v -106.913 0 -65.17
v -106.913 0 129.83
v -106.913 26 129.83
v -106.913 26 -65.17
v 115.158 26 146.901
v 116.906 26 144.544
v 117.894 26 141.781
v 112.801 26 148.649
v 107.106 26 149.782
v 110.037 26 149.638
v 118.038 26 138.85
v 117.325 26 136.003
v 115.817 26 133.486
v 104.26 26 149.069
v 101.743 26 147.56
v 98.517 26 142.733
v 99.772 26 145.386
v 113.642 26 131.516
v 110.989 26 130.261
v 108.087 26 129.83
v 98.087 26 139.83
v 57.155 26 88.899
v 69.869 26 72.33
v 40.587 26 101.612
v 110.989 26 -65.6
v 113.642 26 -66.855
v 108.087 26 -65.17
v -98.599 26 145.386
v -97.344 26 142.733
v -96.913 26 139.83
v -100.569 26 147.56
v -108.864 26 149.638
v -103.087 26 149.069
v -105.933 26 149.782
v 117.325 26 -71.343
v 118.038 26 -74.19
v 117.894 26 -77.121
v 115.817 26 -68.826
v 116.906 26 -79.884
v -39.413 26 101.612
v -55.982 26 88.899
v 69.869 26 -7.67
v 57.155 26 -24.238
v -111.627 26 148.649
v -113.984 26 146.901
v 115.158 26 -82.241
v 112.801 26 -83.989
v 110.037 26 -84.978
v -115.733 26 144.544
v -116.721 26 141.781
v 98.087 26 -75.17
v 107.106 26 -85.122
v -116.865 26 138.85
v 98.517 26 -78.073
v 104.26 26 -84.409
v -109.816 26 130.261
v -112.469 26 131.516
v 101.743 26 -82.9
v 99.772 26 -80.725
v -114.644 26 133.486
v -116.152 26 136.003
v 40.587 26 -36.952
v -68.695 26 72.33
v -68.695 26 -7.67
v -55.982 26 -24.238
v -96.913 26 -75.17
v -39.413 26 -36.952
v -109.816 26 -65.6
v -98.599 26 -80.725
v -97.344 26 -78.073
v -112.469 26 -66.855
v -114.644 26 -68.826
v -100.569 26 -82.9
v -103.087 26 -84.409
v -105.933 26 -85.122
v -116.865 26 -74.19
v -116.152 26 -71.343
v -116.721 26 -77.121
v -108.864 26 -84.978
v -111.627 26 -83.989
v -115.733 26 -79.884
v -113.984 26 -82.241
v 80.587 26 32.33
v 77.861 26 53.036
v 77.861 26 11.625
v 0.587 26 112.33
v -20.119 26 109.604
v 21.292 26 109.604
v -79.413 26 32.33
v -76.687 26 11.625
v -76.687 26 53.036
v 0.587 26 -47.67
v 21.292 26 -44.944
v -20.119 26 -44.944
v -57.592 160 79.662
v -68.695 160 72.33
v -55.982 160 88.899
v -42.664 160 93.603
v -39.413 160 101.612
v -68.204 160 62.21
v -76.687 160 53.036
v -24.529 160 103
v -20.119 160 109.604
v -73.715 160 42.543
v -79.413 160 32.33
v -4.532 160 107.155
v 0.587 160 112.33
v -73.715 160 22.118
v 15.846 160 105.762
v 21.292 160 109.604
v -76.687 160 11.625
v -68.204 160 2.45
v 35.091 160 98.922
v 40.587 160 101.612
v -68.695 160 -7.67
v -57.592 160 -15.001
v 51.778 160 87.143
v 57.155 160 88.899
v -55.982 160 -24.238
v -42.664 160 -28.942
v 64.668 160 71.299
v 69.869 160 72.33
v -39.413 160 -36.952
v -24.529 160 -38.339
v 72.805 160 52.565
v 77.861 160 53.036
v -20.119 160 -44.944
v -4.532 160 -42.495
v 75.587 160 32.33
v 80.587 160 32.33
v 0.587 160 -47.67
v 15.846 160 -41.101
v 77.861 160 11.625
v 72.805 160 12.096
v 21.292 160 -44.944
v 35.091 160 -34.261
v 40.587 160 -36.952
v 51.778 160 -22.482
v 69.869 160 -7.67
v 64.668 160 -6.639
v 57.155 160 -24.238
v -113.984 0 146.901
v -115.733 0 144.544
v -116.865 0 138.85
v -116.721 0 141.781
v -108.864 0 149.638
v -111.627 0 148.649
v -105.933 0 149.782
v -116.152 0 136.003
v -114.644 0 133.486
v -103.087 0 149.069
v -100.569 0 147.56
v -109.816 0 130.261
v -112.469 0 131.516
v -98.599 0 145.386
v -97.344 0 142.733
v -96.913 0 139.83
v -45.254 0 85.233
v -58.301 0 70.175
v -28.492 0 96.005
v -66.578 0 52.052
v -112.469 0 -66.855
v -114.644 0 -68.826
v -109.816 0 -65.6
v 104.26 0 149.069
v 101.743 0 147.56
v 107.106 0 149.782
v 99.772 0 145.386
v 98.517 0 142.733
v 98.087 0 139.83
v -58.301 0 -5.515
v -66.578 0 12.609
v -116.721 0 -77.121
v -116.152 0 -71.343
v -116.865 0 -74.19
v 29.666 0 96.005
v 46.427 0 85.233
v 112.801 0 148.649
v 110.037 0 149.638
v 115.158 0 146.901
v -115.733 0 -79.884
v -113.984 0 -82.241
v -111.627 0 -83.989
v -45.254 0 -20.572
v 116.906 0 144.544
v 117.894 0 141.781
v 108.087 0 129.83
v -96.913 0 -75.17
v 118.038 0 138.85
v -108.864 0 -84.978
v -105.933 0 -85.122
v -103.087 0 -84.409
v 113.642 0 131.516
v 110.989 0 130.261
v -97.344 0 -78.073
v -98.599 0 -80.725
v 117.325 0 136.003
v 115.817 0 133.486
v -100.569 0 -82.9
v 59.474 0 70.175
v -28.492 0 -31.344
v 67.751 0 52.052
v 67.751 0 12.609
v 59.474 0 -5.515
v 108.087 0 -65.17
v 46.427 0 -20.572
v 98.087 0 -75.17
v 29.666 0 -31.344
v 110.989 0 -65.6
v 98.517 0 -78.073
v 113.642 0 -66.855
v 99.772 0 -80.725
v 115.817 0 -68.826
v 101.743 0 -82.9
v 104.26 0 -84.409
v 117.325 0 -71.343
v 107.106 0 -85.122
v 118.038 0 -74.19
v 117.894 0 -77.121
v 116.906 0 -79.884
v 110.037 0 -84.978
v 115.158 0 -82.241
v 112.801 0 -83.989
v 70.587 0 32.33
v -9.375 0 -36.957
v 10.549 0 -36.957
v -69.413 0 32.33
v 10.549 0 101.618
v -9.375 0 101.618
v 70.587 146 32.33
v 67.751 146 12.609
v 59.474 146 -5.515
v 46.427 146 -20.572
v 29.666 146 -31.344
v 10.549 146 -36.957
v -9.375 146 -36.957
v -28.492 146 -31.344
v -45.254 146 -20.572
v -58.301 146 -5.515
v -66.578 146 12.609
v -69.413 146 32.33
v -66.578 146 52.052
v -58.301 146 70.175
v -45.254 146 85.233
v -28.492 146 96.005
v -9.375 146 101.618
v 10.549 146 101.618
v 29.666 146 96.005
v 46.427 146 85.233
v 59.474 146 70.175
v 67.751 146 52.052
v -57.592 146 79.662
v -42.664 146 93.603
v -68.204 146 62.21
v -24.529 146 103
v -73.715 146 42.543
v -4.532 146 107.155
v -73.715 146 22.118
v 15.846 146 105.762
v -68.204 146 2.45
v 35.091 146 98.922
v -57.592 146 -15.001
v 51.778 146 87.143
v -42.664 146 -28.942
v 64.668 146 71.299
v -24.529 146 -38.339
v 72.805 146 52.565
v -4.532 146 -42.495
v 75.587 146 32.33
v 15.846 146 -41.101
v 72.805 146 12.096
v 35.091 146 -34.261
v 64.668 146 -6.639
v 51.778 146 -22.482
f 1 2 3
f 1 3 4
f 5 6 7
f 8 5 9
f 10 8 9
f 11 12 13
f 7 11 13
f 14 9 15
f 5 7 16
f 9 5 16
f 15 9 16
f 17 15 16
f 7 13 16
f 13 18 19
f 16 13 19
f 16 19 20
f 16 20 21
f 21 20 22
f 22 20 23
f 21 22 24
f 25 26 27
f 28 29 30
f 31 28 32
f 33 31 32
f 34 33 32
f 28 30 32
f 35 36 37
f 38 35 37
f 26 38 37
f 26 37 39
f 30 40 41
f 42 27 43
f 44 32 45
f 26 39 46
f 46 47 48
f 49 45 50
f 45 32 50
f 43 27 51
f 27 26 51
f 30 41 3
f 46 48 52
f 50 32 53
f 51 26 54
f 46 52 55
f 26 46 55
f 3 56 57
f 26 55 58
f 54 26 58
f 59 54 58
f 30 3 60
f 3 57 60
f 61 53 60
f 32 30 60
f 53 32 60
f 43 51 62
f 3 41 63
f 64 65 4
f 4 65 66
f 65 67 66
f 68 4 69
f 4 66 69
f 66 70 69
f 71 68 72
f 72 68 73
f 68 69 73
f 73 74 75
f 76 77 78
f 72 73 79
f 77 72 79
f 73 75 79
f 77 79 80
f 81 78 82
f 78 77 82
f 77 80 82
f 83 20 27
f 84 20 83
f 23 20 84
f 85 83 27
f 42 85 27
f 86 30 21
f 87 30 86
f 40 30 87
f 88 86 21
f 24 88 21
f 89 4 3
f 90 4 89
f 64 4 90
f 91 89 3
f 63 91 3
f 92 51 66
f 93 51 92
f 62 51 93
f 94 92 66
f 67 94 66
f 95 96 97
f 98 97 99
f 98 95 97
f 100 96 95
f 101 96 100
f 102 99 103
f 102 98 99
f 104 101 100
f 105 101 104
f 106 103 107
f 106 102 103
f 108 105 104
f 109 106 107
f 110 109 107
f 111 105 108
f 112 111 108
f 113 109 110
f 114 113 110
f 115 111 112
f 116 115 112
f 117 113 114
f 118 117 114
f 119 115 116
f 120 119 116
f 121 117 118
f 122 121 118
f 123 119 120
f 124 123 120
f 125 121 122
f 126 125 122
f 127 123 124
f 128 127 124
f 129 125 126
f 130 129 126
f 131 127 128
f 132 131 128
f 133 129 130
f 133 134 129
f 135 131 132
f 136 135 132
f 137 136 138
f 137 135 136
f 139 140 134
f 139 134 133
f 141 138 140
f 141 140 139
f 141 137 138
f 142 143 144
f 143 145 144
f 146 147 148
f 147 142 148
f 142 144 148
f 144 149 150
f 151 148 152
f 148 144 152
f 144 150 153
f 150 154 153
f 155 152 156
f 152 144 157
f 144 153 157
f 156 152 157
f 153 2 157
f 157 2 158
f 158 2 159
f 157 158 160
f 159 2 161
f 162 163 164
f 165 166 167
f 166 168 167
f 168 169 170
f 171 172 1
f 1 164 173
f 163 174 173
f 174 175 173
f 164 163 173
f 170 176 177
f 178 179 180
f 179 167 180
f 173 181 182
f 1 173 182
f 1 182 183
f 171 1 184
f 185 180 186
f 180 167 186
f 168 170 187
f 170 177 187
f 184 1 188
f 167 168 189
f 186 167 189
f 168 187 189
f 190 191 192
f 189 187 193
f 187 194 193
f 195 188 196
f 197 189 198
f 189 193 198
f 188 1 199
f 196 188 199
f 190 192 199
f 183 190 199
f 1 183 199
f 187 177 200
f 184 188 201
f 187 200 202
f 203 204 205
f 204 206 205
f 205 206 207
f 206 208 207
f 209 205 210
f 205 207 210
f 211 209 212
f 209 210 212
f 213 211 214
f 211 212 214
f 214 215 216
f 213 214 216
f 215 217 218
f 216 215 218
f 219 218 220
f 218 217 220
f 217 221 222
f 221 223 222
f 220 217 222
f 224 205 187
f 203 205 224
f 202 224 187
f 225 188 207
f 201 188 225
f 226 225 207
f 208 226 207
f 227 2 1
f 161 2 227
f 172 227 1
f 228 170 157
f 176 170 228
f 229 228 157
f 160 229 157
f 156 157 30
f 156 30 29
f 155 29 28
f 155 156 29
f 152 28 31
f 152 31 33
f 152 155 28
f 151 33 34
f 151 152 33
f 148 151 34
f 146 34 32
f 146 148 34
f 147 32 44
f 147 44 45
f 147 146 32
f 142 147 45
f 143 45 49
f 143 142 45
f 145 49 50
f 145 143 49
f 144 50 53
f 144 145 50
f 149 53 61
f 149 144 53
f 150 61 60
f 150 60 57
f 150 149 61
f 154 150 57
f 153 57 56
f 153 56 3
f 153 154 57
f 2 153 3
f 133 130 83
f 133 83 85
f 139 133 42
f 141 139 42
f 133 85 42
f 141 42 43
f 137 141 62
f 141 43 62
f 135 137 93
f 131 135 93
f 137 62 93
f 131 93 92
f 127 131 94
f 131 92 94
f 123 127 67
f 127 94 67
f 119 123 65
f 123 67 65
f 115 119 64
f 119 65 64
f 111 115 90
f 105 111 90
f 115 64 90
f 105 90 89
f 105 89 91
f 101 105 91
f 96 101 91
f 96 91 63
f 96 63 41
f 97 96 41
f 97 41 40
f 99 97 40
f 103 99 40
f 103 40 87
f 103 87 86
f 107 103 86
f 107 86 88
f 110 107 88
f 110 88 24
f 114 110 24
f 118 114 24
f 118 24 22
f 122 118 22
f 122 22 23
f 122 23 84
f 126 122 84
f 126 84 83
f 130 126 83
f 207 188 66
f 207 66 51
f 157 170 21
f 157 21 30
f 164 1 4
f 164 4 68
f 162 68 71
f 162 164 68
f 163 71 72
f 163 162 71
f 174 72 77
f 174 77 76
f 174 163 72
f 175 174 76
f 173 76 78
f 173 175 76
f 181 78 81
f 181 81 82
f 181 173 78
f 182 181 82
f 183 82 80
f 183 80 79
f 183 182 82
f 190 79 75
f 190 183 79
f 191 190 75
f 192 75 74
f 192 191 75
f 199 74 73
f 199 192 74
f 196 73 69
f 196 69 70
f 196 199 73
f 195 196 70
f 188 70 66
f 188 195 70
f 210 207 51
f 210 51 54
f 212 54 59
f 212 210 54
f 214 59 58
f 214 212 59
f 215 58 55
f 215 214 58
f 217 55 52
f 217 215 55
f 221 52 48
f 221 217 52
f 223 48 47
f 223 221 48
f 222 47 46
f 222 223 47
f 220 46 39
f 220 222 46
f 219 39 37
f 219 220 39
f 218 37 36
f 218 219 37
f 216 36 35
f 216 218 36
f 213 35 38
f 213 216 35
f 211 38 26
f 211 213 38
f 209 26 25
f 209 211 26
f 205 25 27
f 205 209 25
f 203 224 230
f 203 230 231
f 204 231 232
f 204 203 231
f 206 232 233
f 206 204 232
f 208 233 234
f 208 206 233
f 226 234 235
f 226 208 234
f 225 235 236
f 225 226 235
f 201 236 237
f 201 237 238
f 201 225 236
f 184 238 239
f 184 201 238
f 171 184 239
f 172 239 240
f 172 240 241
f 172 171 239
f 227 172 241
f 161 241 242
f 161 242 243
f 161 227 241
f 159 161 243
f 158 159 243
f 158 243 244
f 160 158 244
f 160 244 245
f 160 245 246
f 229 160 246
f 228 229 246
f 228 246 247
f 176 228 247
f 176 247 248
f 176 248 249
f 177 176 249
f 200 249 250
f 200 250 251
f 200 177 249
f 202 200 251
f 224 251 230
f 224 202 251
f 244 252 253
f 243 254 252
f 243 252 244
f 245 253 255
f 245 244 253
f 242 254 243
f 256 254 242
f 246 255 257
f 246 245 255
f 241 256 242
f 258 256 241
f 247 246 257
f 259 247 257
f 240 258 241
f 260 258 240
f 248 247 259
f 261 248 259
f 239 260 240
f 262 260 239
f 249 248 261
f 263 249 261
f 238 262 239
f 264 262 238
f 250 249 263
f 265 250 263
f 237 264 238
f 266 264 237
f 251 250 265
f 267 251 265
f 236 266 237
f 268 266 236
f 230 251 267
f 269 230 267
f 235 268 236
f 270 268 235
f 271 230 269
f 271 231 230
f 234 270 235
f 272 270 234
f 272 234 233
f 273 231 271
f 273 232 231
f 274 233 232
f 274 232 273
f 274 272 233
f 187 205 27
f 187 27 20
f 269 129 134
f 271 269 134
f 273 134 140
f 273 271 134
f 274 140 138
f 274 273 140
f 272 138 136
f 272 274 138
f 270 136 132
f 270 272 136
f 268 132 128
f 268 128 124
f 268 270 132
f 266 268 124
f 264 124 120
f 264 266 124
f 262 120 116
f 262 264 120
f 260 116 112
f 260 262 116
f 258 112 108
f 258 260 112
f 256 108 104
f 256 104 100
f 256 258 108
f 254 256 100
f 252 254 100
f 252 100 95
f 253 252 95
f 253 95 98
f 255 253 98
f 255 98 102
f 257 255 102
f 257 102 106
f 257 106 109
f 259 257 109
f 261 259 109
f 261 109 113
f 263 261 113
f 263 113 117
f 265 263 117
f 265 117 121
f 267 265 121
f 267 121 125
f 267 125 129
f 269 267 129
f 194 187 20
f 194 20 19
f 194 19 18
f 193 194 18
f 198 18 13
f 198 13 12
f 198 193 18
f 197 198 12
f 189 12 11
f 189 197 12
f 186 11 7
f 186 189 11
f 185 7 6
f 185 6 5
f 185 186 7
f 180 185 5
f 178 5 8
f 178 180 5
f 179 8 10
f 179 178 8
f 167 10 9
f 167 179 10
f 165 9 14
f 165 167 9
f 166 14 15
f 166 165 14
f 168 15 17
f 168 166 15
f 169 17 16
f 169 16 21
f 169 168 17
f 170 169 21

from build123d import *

# Parameters (mm, degrees)
IZIM1_R                     = 80
Y_KSEKLIK_EKSTR_ZYON1_DEPTH = 26
IZIM1_7_R                   = 80
IZIM1_7_R_2                 = 75
Y_KSEKLIK_EKSTR_ZYON2_DEPTH = 160
IZIM1_9_R                   = 75
IZIM1_9_R_2                 = 70
Y_KSEKLIK_EKSTR_ZYON3_DEPTH = 146


with BuildPart() as part:
    # Çizim1 → Yükseklik-Ekstrüzyon1 (new body)
    with BuildSketch(Plane(origin=(0, 0, 0), x_dir=(1, 0, 0), z_dir=(0, 1, 0))):
        with BuildLine():
            Line((98.086576189, 75.169734496), (-96.913423811, 75.169734496))
            ThreePointArc((-96.913423811, 75.169734496), (-113.984491623, 82.240802308), (-106.913423811, 65.169734496))
            Line((-106.913423811, 65.169734496), (-106.913423811, -129.830265504))
            ThreePointArc((-106.913423811, -129.830265504), (-113.984491623, -146.901333316), (-96.913423811, -139.830265504))
            Line((-96.913423811, -139.830265504), (98.086576189, -139.830265504))
            ThreePointArc((98.086576189, -139.830265504), (115.157644, -146.901333316), (108.086576189, -129.830265504))
            Line((108.086576189, -129.830265504), (108.086576189, 65.169734496))
            ThreePointArc((108.086576189, 65.169734496), (115.157644, 82.240802308), (98.086576189, 75.169734496))
        make_face()
        with Locations((0.586576189, -32.330265504)):
            Circle(IZIM1_R, mode=Mode.SUBTRACT)
    extrude(amount=Y_KSEKLIK_EKSTR_ZYON1_DEPTH)

    # Çizim1<7> → Yükseklik-Ekstrüzyon2 (add)
    with BuildSketch(Plane(origin=(0, 0, 0), x_dir=(1, 0, 0), z_dir=(0, 1, 0))):
        with Locations((0.586576189, -32.330265504)):
            Circle(IZIM1_7_R)
        with Locations((0.586576189, -32.330265504)):
            Circle(IZIM1_7_R_2, mode=Mode.SUBTRACT)
    extrude(amount=Y_KSEKLIK_EKSTR_ZYON2_DEPTH)

    # Çizim1<9> → Yükseklik-Ekstrüzyon3 (add)
    with BuildSketch(Plane(origin=(0, 0, 0), x_dir=(1, 0, 0), z_dir=(0, 1, 0))):
        with Locations((0.586576189, -32.330265504)):
            Circle(IZIM1_9_R)
        with Locations((0.586576189, -32.330265504)):
            Circle(IZIM1_9_R_2, mode=Mode.SUBTRACT)
    extrude(amount=Y_KSEKLIK_EKSTR_ZYON3_DEPTH)


solid = part.part
